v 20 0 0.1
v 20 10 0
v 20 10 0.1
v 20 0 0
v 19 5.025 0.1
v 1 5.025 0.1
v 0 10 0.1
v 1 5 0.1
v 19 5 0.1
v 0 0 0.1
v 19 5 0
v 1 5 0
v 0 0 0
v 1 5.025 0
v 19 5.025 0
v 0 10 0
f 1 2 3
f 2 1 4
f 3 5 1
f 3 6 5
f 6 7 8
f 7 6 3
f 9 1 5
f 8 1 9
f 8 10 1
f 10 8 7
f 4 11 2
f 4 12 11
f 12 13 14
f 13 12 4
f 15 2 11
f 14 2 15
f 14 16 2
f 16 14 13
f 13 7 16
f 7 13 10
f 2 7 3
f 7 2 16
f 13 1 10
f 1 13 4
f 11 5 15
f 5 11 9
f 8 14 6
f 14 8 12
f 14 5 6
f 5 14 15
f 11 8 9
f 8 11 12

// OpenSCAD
//design by Sean Murphy

//This code generates a simple collimating slit of customisable size.

/* [Global] */


//width of plate
width=20;

//height of plate
height=10;

//thickness of plate
depth=0.1;

//slit height
slit_height=0.025;

//set openSCAD resolution
$fa=1;
$fs=1;

difference() {
cube([width,height,depth], 0);
translate([1,height/2, 0])
cube([width-2,slit_height,depth], 0);
}
